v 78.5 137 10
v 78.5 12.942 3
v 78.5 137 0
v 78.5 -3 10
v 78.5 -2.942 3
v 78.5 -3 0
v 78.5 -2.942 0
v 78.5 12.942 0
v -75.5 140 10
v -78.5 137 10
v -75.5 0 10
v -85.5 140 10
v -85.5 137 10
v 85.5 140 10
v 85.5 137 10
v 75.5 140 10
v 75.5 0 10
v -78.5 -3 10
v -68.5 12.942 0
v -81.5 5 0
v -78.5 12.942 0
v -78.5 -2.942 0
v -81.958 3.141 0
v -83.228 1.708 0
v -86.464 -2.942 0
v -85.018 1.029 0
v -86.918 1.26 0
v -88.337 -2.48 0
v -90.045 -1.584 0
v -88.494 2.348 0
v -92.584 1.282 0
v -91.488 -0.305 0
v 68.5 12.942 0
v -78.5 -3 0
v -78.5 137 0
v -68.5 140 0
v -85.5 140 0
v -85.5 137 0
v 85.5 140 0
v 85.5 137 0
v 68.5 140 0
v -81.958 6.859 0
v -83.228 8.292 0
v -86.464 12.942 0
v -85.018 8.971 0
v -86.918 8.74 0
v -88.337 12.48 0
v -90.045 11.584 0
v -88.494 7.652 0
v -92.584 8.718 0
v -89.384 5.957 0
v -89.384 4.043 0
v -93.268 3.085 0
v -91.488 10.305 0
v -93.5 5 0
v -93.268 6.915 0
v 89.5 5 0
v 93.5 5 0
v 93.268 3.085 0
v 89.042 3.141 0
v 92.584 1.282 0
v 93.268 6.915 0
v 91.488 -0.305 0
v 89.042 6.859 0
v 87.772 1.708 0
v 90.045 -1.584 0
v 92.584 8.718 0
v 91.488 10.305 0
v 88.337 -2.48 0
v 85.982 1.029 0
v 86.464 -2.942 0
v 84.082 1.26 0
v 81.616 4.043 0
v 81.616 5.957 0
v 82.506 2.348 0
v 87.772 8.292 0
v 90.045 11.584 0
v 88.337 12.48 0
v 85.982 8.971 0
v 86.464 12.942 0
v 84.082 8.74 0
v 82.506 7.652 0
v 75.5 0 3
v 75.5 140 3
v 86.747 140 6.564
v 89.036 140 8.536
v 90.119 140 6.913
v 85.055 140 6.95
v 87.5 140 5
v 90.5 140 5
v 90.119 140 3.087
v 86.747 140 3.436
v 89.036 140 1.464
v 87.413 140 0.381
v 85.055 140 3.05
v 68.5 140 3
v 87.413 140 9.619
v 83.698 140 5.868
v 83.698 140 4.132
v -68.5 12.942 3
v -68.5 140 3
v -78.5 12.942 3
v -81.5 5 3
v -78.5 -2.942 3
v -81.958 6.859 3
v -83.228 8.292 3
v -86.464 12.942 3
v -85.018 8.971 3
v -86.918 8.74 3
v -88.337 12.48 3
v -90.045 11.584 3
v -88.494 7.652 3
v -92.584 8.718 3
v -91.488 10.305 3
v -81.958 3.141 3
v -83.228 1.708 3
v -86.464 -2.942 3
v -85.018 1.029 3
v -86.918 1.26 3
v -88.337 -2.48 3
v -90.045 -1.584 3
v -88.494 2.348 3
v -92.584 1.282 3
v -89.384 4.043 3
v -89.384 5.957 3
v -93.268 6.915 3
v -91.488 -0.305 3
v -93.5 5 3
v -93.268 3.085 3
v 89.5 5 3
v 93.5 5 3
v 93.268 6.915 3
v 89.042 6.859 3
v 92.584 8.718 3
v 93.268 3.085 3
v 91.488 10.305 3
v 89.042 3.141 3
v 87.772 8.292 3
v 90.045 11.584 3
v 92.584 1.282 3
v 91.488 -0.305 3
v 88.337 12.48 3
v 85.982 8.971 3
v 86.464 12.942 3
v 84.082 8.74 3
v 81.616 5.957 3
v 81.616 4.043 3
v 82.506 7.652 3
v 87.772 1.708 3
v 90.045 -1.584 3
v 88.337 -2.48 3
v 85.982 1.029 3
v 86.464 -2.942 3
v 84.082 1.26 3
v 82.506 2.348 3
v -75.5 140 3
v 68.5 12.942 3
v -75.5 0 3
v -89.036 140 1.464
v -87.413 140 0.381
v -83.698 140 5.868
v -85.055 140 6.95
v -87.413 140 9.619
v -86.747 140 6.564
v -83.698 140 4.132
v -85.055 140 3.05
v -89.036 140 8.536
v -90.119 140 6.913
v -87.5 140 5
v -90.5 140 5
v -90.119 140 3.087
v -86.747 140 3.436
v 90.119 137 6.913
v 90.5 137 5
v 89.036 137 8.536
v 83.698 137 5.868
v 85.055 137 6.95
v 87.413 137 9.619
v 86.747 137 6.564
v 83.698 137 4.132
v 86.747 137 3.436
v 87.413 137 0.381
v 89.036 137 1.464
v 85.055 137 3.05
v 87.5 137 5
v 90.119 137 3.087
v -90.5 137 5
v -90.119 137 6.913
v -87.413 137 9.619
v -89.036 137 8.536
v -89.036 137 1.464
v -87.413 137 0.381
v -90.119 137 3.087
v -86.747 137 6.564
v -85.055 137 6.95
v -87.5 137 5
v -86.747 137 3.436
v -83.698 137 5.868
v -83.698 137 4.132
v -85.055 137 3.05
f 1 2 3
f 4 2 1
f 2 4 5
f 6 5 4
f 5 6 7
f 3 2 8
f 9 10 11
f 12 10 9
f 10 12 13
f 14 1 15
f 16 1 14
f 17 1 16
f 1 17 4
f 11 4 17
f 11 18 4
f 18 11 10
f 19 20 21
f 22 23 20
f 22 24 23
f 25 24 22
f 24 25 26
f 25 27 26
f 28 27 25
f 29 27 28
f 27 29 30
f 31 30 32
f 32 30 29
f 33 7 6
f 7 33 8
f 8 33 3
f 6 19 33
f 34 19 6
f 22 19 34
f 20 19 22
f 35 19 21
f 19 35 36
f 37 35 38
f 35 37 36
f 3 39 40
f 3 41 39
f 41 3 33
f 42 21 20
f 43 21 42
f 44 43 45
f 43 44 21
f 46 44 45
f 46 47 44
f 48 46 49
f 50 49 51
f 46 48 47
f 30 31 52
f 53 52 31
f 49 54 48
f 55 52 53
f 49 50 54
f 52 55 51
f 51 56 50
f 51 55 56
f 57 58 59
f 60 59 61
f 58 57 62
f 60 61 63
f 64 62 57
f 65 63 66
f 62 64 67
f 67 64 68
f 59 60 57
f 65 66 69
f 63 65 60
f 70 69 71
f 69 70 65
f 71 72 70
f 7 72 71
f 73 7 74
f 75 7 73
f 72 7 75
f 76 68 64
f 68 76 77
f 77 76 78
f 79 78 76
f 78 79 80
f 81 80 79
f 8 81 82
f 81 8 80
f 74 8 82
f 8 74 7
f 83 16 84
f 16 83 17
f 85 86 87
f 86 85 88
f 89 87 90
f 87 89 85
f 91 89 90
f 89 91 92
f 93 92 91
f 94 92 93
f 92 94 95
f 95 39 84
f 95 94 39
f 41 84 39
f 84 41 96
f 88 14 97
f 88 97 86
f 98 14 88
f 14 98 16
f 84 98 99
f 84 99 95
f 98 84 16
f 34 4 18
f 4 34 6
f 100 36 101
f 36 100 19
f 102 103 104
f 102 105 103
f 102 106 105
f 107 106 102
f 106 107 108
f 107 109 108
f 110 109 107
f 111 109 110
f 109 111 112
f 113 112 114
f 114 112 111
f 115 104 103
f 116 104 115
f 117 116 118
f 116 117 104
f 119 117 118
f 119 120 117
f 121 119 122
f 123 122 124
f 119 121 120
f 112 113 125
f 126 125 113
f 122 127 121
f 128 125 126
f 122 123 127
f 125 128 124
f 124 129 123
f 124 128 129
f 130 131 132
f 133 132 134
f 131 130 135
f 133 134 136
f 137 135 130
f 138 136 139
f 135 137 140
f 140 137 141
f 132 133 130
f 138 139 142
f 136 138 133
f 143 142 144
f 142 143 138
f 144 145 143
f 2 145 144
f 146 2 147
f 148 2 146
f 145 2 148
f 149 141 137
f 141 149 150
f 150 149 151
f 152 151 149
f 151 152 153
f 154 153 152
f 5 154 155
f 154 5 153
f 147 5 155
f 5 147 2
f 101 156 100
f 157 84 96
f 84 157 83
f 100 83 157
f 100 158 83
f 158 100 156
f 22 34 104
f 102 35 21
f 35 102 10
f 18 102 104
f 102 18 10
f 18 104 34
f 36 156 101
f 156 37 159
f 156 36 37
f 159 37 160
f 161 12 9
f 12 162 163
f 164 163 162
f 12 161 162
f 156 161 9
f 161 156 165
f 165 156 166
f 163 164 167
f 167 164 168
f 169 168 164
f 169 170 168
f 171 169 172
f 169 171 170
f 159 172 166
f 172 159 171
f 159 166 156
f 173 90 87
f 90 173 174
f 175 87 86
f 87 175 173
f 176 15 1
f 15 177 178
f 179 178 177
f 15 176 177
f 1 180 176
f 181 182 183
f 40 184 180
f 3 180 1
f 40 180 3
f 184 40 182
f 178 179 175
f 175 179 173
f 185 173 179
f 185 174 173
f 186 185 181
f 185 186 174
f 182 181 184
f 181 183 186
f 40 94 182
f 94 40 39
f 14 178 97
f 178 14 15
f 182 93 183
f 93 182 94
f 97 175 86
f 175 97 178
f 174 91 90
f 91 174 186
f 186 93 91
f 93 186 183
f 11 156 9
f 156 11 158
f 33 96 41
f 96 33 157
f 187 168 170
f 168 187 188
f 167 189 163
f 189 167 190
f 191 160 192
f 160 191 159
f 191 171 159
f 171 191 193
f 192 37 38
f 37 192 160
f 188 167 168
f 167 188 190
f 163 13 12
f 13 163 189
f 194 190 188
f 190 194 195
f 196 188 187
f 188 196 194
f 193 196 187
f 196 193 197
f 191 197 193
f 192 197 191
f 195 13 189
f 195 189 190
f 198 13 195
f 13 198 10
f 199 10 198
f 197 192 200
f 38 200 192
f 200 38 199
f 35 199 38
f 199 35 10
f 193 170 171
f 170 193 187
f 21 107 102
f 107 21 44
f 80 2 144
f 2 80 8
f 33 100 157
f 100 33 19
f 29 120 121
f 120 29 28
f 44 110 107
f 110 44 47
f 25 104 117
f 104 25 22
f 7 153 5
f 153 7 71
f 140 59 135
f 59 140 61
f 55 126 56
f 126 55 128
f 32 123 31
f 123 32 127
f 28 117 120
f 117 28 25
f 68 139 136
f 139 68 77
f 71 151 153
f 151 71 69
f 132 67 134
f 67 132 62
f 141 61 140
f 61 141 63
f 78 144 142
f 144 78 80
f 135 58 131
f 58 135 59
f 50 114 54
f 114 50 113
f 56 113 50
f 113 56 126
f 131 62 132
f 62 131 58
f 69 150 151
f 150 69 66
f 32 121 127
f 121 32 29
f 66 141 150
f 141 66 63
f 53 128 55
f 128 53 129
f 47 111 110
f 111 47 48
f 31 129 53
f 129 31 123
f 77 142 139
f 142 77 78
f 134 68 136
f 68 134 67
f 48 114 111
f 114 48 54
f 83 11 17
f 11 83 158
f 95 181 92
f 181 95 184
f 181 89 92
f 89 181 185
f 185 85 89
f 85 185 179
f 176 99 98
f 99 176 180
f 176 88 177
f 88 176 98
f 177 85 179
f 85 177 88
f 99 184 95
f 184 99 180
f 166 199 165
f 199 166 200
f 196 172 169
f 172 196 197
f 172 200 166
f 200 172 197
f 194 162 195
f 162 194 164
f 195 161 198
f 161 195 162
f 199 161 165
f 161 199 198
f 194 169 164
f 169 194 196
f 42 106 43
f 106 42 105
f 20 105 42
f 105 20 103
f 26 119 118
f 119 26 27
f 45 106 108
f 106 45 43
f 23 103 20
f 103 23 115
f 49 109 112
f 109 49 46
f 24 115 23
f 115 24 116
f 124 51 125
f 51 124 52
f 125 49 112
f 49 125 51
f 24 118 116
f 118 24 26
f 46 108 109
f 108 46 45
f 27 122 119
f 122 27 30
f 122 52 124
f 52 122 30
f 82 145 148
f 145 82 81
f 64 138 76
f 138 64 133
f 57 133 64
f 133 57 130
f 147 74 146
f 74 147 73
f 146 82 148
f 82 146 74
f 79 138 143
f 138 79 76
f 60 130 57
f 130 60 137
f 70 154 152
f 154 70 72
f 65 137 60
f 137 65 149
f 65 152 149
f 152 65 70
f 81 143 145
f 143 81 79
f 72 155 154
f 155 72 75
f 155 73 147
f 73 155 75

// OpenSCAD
// file: ../config.scad
r4 = 2.2;
r8 = 4.2;
r10 = 5.2;

layer_height = 0.25;

switch_d = 9.6;

nema17_r_vis = 15.5;
nema17_r_centre = 11.5;
nema17_h_centre = 2;
nema17_h = 43;
nema17_l = 40;

boite_ui_largeur = 28.5;
boite_ui_l = 46;

support_laser = 24;

r3 = 1.75;
r3_2d = 1.5;
r3_vis = 1.65;
r3_head = 3.6;
m3_r = r3;
m3_nut_d = 7;
m3_nut_d2 = 6.2;
m3_nut_h = 3;

m4_nut_d = 8;
m4_nut_d2 = 7;
m4_nut_h = 4;

608_r = 23/2;
608_h = 8;

laser_printer_l = 609;
laser_printer_lg = 456;

module support_nut(d=3, l_screw1 = 20, l_screw2 = 20, l_nut = 20, h_screw2 = -0.1){
    if(d==3){
        screw_r = r3;
        nut_r = m3_nut_d/2;
        nut_h = m3_nut_h;
        cylinder(nut_h, r = nut_r, $fn = 6, center = true);
        translate([0, 0, -l_screw1])cylinder(l_screw1 +1, r = screw_r);
        translate([0, 0, m3_nut_h/2+ h_screw2])cylinder(l_screw2, r = screw_r);
        l = m3_nut_d*cos(30);
        translate([0, -l/2, -nut_h/2]) cube([l_nut, l,nut_h]);
    } else if(d==4){
        screw_r = r4;
        nut_r = m4_nut_d/2;
        nut_h = m4_nut_h;
        cylinder(nut_h, r = nut_r, $fn = 6, center = true);
        translate([0, 0, -l_screw1])cylinder(l_screw1 +1, r = screw_r);
        translate([0, 0, m4_nut_h/2+ h_screw2])cylinder(l_screw2, r = screw_r);
        l = m4_nut_d*cos(30);
        translate([0, -l/2, -nut_h/2]) cube([l_nut, l,nut_h]);
    }
}


module nut(d=3, center = false){
    nut_r = m3_nut_d/2;
    nut_h = m3_nut_h;
    if(d==3){
        nut_r = m3_nut_d/2;
        nut_h = m3_nut_h;
    } 
    cylinder(nut_h, r = nut_r, $fn = 6, center = center);
}



module m3(h, nut = false, head = false){
    cylinder(h, m3_r, m3_r, $fn=16);
    if(nut){
        cylinder(m3_nut_h, r = m3_nut_d/2, $fn = 6);
    }
}

module m3_nut(h){
    cylinder(m3_nut_h, r = m3_nut_d/2, $fn = 6);
    translate([0, -m3_nut_d2/2, 0]) cube([h, m3_nut_d2, m3_nut_h]);
}

m4_r = 2.3;
m4_nut_d = 8.4;
m4_nut_d2 = 7.5;
m4_nut_h = 3.5;
module m4(h, nut = false, head = false){
    cylinder(h, m4_r, m4_r);
    if(nut){
        cylinder(m4_nut_h, r = m4_nut_d/2, $fn = 6);
    }
}

module m5(h, nut = false, head = false){
    cylinder(h, r = 2.7);
}

m8_nut_d = 15;
m8_nut_d2 = 13;
m8_nut_h = 6.5;
module m8(h, nut = false, head = false){
    cylinder(h, r = r8);
    if(nut){
        cylinder(m8_nut_h, r = m8_nut_d/2, $fn = 6);
    }
}

module cube_arrondi(x, y, z, r=2){
    hull(){
        translate([(x/2-r), (y/2-r), 0]) cylinder(z,r=r);
        translate([(x/2-r), -(y/2-r), 0]) cylinder(z,r=r);
        translate([-(x/2-r), (y/2-r), 0]) cylinder(z,r=r);
        translate([-(x/2-r), -(y/2-r), 0]) cylinder(z,r=r);
    }
}

module demi_glissiere(r, l, h){
    cylinder(h, r, r);
    translate([-r, 0, 0]) cube([r*2, l, h]);
}


module nema17_2d(){
    nema17_l = 43;
    nema17_h = 6;
    polygon([[0,nema17_h], [nema17_h,0]
            , [nema17_l-nema17_h,0],[nema17_l,nema17_h]
            , [nema17_l,nema17_l-nema17_h],[nema17_l-nema17_h,nema17_l]
            , [8,nema17_l],[0,nema17_l-nema17_h] ]);
}

module nema17_2d2(){
    translate([nema17_r_vis, nema17_r_vis] ) circle(r3_2d);
    translate([nema17_r_vis, -nema17_r_vis] ) circle(r3_2d);
    translate([-nema17_r_vis, nema17_r_vis] ) circle(r3_2d);
    translate([-nema17_r_vis, -nema17_r_vis] ) circle(r3_2d);
    circle(nema17_r_centre);
}


module nema17(){
    translate([-nema17_h/2, -nema17_h/2, -nema17_l/2] ) linear_extrude(nema17_l) nema17_2d();
    
    h = nema17_h/2+6;
    translate([nema17_r_vis, nema17_r_vis, 0] )rotate([0, 0, 0]) cylinder(h, r = r3);
    translate([nema17_r_vis, -nema17_r_vis, 0] )rotate([0, 0, 0]) cylinder(h, r = r3);
    translate([-nema17_r_vis, nema17_r_vis, 0] )rotate([0, 0, 0]) cylinder(h, r = r3);
    translate([-nema17_r_vis, -nema17_r_vis, 0] )rotate([0, 0, 0]) cylinder(h, r = r3);
    cylinder(h, nema17_r_centre, nema17_r_centre);
    cylinder(h+14, r = 8);
    
    translate([-8.5, 0, -nema17_l/2] ) cube([17,30, 10]);
}

module corner(l_corner, h_corner, lg_corner){
    translate([0, lg_corner, 0]) rotate([90, 0, 0]) linear_extrude(lg_corner) polygon([[0,0], [l_corner, 0], [0, h_corner]]);
}


/**
 * 2D
 **/

module m3_2d(){
    circle(r3_2d);
}


module cran_x(_l, e, cran, inv){
    difference(){
        square([_l, e]);
        if(inv){
            for(i=[-round(_l/cran):round(_l/cran)]){
                translate([_l/2 + cran/2 - 2*i*cran, -1]) square([cran, e+2]);
            }
        }else{
            for(i=[-round(_l/cran):round(_l/cran)]){
                translate([_l/2 - cran/2 - 2*i*cran, -1]) square([cran, e+2]);
            }
        }
    }
}

module cran_y(_l, e, cran, inv){
    translate([e, 0]) rotate([0, 0, 90]) cran_x(_l, e, cran, inv); 
}

module whole_2d(type_vis){
    if(type_vis == 3){
        circle(1.5);
    } else if(type_vis == 4){
        circle(2);
    } else {
        echo("whole_2d " + type_vis);
    }
}

module nuts_2d(type_vis){
    if(type_vis == 3){
        translate([-1.5, 0])square([3, 20]);
        translate([-5.5/2, 10])square([5.5, 2.5]);
    } else if(type_vis == 4){
        translate([-2, 0])square([4, 30]);
        translate([-7/2, 20])square([7, 3.5]);
    } else {
        echo("nuts_2d " + type_vis);
    }
}

module cran_x_vis(_l, e, cran, type_vis = 3, trous = [0.1, 0.5, 0.9]){
    difference(){
        square([_l, e]);
        for(i=[-round(_l/cran):round(_l/cran)]){
                translate([_l/2 - cran/2 - 2*i*cran, -1]) square([cran, e+2]);
            }
        
    }
    for(i = trous){
        j = round((i-0.5)*_l/(2*cran));
        translate([_l/2  - 2*j*cran, e/2]) whole_2d(type_vis);
    }
}

module cran_x_nuts(_l, e, cran, type_vis = 3, trous = [0.1, 0.5, 0.9]){
    difference(){
        square([_l, e]);
        for(i=[-round(_l/cran):round(_l/cran)]){
                translate([_l/2 + cran/2 - 2*i*cran, -1]) square([cran, e+2]);
        }
    }
    for(i = trous){
        j = round((i-0.5)*_l/(2*cran));
        translate([_l/2  - 2*j*cran, e/2]) nuts_2d(type_vis);
    }
}

module cran_y_vis(_l, e, cran, type_vis = 3, trous = [0.1, 0.5, 0.9]){
    translate([e, 0]) rotate([0, 0, 90]) cran_x_vis(_l, e, cran, type_vis, trous);
}

module cran_y_nuts(_l, e, cran, type_vis = 3, trous = [0.1, 0.5, 0.9]){
    translate([0, _l]) rotate([0, 0, -90]) cran_x_nuts(_l, e, cran, type_vis, trous);
}


module fixation_2d(){
    translate([-5,0])square([2,4], center=true);
    translate([5,0])square([2,4], center=true);
}
// main file
include <../config.scad>

h = 10;
e1 = 10;
e = 3;

l = 140;
lg = 151;

difference(){
    union(){
        hull(){
            translate([-lg/2-e1, 8-e, 0])cylinder(e, r=8);
            translate([+lg/2+e1, 8-e, 0])cylinder(e, r=8);
        }
        translate([-lg/2-e, -e,0]) cube([lg+2*e, e, h]);
        for(i = [0,1]){
            mirror([i,0,0])translate([lg/2, -e,0]) cube([ e, l+e, h]);
            mirror([i,0,0])translate([-lg/2- e, -e,0]) cube([ h, l+e, e]);
            
            mirror([i,0,0]) translate([lg/2, l-e, 0]) hull(){
                cube([ e, e, h]);
                translate([h, 0, h/2]) rotate([-90,0,0])cylinder(e, r=h/2);
            }
        }
        
    }
    translate([-lg/2-e1, 8-e, -1])cylinder(e+2, r=4);
    translate([+lg/2+e1, 8-e, -1])cylinder(e+2, r=4);
    %translate([-lg/2, 0, e]) cube([lg, l, 100]);
    for(i = [0,1]){
        mirror([i,0,0]) translate([lg/2, l-e, 0]) translate([h, 0, h/2]) rotate([-90,0,0])cylinder(e, r=2);
    }
}
